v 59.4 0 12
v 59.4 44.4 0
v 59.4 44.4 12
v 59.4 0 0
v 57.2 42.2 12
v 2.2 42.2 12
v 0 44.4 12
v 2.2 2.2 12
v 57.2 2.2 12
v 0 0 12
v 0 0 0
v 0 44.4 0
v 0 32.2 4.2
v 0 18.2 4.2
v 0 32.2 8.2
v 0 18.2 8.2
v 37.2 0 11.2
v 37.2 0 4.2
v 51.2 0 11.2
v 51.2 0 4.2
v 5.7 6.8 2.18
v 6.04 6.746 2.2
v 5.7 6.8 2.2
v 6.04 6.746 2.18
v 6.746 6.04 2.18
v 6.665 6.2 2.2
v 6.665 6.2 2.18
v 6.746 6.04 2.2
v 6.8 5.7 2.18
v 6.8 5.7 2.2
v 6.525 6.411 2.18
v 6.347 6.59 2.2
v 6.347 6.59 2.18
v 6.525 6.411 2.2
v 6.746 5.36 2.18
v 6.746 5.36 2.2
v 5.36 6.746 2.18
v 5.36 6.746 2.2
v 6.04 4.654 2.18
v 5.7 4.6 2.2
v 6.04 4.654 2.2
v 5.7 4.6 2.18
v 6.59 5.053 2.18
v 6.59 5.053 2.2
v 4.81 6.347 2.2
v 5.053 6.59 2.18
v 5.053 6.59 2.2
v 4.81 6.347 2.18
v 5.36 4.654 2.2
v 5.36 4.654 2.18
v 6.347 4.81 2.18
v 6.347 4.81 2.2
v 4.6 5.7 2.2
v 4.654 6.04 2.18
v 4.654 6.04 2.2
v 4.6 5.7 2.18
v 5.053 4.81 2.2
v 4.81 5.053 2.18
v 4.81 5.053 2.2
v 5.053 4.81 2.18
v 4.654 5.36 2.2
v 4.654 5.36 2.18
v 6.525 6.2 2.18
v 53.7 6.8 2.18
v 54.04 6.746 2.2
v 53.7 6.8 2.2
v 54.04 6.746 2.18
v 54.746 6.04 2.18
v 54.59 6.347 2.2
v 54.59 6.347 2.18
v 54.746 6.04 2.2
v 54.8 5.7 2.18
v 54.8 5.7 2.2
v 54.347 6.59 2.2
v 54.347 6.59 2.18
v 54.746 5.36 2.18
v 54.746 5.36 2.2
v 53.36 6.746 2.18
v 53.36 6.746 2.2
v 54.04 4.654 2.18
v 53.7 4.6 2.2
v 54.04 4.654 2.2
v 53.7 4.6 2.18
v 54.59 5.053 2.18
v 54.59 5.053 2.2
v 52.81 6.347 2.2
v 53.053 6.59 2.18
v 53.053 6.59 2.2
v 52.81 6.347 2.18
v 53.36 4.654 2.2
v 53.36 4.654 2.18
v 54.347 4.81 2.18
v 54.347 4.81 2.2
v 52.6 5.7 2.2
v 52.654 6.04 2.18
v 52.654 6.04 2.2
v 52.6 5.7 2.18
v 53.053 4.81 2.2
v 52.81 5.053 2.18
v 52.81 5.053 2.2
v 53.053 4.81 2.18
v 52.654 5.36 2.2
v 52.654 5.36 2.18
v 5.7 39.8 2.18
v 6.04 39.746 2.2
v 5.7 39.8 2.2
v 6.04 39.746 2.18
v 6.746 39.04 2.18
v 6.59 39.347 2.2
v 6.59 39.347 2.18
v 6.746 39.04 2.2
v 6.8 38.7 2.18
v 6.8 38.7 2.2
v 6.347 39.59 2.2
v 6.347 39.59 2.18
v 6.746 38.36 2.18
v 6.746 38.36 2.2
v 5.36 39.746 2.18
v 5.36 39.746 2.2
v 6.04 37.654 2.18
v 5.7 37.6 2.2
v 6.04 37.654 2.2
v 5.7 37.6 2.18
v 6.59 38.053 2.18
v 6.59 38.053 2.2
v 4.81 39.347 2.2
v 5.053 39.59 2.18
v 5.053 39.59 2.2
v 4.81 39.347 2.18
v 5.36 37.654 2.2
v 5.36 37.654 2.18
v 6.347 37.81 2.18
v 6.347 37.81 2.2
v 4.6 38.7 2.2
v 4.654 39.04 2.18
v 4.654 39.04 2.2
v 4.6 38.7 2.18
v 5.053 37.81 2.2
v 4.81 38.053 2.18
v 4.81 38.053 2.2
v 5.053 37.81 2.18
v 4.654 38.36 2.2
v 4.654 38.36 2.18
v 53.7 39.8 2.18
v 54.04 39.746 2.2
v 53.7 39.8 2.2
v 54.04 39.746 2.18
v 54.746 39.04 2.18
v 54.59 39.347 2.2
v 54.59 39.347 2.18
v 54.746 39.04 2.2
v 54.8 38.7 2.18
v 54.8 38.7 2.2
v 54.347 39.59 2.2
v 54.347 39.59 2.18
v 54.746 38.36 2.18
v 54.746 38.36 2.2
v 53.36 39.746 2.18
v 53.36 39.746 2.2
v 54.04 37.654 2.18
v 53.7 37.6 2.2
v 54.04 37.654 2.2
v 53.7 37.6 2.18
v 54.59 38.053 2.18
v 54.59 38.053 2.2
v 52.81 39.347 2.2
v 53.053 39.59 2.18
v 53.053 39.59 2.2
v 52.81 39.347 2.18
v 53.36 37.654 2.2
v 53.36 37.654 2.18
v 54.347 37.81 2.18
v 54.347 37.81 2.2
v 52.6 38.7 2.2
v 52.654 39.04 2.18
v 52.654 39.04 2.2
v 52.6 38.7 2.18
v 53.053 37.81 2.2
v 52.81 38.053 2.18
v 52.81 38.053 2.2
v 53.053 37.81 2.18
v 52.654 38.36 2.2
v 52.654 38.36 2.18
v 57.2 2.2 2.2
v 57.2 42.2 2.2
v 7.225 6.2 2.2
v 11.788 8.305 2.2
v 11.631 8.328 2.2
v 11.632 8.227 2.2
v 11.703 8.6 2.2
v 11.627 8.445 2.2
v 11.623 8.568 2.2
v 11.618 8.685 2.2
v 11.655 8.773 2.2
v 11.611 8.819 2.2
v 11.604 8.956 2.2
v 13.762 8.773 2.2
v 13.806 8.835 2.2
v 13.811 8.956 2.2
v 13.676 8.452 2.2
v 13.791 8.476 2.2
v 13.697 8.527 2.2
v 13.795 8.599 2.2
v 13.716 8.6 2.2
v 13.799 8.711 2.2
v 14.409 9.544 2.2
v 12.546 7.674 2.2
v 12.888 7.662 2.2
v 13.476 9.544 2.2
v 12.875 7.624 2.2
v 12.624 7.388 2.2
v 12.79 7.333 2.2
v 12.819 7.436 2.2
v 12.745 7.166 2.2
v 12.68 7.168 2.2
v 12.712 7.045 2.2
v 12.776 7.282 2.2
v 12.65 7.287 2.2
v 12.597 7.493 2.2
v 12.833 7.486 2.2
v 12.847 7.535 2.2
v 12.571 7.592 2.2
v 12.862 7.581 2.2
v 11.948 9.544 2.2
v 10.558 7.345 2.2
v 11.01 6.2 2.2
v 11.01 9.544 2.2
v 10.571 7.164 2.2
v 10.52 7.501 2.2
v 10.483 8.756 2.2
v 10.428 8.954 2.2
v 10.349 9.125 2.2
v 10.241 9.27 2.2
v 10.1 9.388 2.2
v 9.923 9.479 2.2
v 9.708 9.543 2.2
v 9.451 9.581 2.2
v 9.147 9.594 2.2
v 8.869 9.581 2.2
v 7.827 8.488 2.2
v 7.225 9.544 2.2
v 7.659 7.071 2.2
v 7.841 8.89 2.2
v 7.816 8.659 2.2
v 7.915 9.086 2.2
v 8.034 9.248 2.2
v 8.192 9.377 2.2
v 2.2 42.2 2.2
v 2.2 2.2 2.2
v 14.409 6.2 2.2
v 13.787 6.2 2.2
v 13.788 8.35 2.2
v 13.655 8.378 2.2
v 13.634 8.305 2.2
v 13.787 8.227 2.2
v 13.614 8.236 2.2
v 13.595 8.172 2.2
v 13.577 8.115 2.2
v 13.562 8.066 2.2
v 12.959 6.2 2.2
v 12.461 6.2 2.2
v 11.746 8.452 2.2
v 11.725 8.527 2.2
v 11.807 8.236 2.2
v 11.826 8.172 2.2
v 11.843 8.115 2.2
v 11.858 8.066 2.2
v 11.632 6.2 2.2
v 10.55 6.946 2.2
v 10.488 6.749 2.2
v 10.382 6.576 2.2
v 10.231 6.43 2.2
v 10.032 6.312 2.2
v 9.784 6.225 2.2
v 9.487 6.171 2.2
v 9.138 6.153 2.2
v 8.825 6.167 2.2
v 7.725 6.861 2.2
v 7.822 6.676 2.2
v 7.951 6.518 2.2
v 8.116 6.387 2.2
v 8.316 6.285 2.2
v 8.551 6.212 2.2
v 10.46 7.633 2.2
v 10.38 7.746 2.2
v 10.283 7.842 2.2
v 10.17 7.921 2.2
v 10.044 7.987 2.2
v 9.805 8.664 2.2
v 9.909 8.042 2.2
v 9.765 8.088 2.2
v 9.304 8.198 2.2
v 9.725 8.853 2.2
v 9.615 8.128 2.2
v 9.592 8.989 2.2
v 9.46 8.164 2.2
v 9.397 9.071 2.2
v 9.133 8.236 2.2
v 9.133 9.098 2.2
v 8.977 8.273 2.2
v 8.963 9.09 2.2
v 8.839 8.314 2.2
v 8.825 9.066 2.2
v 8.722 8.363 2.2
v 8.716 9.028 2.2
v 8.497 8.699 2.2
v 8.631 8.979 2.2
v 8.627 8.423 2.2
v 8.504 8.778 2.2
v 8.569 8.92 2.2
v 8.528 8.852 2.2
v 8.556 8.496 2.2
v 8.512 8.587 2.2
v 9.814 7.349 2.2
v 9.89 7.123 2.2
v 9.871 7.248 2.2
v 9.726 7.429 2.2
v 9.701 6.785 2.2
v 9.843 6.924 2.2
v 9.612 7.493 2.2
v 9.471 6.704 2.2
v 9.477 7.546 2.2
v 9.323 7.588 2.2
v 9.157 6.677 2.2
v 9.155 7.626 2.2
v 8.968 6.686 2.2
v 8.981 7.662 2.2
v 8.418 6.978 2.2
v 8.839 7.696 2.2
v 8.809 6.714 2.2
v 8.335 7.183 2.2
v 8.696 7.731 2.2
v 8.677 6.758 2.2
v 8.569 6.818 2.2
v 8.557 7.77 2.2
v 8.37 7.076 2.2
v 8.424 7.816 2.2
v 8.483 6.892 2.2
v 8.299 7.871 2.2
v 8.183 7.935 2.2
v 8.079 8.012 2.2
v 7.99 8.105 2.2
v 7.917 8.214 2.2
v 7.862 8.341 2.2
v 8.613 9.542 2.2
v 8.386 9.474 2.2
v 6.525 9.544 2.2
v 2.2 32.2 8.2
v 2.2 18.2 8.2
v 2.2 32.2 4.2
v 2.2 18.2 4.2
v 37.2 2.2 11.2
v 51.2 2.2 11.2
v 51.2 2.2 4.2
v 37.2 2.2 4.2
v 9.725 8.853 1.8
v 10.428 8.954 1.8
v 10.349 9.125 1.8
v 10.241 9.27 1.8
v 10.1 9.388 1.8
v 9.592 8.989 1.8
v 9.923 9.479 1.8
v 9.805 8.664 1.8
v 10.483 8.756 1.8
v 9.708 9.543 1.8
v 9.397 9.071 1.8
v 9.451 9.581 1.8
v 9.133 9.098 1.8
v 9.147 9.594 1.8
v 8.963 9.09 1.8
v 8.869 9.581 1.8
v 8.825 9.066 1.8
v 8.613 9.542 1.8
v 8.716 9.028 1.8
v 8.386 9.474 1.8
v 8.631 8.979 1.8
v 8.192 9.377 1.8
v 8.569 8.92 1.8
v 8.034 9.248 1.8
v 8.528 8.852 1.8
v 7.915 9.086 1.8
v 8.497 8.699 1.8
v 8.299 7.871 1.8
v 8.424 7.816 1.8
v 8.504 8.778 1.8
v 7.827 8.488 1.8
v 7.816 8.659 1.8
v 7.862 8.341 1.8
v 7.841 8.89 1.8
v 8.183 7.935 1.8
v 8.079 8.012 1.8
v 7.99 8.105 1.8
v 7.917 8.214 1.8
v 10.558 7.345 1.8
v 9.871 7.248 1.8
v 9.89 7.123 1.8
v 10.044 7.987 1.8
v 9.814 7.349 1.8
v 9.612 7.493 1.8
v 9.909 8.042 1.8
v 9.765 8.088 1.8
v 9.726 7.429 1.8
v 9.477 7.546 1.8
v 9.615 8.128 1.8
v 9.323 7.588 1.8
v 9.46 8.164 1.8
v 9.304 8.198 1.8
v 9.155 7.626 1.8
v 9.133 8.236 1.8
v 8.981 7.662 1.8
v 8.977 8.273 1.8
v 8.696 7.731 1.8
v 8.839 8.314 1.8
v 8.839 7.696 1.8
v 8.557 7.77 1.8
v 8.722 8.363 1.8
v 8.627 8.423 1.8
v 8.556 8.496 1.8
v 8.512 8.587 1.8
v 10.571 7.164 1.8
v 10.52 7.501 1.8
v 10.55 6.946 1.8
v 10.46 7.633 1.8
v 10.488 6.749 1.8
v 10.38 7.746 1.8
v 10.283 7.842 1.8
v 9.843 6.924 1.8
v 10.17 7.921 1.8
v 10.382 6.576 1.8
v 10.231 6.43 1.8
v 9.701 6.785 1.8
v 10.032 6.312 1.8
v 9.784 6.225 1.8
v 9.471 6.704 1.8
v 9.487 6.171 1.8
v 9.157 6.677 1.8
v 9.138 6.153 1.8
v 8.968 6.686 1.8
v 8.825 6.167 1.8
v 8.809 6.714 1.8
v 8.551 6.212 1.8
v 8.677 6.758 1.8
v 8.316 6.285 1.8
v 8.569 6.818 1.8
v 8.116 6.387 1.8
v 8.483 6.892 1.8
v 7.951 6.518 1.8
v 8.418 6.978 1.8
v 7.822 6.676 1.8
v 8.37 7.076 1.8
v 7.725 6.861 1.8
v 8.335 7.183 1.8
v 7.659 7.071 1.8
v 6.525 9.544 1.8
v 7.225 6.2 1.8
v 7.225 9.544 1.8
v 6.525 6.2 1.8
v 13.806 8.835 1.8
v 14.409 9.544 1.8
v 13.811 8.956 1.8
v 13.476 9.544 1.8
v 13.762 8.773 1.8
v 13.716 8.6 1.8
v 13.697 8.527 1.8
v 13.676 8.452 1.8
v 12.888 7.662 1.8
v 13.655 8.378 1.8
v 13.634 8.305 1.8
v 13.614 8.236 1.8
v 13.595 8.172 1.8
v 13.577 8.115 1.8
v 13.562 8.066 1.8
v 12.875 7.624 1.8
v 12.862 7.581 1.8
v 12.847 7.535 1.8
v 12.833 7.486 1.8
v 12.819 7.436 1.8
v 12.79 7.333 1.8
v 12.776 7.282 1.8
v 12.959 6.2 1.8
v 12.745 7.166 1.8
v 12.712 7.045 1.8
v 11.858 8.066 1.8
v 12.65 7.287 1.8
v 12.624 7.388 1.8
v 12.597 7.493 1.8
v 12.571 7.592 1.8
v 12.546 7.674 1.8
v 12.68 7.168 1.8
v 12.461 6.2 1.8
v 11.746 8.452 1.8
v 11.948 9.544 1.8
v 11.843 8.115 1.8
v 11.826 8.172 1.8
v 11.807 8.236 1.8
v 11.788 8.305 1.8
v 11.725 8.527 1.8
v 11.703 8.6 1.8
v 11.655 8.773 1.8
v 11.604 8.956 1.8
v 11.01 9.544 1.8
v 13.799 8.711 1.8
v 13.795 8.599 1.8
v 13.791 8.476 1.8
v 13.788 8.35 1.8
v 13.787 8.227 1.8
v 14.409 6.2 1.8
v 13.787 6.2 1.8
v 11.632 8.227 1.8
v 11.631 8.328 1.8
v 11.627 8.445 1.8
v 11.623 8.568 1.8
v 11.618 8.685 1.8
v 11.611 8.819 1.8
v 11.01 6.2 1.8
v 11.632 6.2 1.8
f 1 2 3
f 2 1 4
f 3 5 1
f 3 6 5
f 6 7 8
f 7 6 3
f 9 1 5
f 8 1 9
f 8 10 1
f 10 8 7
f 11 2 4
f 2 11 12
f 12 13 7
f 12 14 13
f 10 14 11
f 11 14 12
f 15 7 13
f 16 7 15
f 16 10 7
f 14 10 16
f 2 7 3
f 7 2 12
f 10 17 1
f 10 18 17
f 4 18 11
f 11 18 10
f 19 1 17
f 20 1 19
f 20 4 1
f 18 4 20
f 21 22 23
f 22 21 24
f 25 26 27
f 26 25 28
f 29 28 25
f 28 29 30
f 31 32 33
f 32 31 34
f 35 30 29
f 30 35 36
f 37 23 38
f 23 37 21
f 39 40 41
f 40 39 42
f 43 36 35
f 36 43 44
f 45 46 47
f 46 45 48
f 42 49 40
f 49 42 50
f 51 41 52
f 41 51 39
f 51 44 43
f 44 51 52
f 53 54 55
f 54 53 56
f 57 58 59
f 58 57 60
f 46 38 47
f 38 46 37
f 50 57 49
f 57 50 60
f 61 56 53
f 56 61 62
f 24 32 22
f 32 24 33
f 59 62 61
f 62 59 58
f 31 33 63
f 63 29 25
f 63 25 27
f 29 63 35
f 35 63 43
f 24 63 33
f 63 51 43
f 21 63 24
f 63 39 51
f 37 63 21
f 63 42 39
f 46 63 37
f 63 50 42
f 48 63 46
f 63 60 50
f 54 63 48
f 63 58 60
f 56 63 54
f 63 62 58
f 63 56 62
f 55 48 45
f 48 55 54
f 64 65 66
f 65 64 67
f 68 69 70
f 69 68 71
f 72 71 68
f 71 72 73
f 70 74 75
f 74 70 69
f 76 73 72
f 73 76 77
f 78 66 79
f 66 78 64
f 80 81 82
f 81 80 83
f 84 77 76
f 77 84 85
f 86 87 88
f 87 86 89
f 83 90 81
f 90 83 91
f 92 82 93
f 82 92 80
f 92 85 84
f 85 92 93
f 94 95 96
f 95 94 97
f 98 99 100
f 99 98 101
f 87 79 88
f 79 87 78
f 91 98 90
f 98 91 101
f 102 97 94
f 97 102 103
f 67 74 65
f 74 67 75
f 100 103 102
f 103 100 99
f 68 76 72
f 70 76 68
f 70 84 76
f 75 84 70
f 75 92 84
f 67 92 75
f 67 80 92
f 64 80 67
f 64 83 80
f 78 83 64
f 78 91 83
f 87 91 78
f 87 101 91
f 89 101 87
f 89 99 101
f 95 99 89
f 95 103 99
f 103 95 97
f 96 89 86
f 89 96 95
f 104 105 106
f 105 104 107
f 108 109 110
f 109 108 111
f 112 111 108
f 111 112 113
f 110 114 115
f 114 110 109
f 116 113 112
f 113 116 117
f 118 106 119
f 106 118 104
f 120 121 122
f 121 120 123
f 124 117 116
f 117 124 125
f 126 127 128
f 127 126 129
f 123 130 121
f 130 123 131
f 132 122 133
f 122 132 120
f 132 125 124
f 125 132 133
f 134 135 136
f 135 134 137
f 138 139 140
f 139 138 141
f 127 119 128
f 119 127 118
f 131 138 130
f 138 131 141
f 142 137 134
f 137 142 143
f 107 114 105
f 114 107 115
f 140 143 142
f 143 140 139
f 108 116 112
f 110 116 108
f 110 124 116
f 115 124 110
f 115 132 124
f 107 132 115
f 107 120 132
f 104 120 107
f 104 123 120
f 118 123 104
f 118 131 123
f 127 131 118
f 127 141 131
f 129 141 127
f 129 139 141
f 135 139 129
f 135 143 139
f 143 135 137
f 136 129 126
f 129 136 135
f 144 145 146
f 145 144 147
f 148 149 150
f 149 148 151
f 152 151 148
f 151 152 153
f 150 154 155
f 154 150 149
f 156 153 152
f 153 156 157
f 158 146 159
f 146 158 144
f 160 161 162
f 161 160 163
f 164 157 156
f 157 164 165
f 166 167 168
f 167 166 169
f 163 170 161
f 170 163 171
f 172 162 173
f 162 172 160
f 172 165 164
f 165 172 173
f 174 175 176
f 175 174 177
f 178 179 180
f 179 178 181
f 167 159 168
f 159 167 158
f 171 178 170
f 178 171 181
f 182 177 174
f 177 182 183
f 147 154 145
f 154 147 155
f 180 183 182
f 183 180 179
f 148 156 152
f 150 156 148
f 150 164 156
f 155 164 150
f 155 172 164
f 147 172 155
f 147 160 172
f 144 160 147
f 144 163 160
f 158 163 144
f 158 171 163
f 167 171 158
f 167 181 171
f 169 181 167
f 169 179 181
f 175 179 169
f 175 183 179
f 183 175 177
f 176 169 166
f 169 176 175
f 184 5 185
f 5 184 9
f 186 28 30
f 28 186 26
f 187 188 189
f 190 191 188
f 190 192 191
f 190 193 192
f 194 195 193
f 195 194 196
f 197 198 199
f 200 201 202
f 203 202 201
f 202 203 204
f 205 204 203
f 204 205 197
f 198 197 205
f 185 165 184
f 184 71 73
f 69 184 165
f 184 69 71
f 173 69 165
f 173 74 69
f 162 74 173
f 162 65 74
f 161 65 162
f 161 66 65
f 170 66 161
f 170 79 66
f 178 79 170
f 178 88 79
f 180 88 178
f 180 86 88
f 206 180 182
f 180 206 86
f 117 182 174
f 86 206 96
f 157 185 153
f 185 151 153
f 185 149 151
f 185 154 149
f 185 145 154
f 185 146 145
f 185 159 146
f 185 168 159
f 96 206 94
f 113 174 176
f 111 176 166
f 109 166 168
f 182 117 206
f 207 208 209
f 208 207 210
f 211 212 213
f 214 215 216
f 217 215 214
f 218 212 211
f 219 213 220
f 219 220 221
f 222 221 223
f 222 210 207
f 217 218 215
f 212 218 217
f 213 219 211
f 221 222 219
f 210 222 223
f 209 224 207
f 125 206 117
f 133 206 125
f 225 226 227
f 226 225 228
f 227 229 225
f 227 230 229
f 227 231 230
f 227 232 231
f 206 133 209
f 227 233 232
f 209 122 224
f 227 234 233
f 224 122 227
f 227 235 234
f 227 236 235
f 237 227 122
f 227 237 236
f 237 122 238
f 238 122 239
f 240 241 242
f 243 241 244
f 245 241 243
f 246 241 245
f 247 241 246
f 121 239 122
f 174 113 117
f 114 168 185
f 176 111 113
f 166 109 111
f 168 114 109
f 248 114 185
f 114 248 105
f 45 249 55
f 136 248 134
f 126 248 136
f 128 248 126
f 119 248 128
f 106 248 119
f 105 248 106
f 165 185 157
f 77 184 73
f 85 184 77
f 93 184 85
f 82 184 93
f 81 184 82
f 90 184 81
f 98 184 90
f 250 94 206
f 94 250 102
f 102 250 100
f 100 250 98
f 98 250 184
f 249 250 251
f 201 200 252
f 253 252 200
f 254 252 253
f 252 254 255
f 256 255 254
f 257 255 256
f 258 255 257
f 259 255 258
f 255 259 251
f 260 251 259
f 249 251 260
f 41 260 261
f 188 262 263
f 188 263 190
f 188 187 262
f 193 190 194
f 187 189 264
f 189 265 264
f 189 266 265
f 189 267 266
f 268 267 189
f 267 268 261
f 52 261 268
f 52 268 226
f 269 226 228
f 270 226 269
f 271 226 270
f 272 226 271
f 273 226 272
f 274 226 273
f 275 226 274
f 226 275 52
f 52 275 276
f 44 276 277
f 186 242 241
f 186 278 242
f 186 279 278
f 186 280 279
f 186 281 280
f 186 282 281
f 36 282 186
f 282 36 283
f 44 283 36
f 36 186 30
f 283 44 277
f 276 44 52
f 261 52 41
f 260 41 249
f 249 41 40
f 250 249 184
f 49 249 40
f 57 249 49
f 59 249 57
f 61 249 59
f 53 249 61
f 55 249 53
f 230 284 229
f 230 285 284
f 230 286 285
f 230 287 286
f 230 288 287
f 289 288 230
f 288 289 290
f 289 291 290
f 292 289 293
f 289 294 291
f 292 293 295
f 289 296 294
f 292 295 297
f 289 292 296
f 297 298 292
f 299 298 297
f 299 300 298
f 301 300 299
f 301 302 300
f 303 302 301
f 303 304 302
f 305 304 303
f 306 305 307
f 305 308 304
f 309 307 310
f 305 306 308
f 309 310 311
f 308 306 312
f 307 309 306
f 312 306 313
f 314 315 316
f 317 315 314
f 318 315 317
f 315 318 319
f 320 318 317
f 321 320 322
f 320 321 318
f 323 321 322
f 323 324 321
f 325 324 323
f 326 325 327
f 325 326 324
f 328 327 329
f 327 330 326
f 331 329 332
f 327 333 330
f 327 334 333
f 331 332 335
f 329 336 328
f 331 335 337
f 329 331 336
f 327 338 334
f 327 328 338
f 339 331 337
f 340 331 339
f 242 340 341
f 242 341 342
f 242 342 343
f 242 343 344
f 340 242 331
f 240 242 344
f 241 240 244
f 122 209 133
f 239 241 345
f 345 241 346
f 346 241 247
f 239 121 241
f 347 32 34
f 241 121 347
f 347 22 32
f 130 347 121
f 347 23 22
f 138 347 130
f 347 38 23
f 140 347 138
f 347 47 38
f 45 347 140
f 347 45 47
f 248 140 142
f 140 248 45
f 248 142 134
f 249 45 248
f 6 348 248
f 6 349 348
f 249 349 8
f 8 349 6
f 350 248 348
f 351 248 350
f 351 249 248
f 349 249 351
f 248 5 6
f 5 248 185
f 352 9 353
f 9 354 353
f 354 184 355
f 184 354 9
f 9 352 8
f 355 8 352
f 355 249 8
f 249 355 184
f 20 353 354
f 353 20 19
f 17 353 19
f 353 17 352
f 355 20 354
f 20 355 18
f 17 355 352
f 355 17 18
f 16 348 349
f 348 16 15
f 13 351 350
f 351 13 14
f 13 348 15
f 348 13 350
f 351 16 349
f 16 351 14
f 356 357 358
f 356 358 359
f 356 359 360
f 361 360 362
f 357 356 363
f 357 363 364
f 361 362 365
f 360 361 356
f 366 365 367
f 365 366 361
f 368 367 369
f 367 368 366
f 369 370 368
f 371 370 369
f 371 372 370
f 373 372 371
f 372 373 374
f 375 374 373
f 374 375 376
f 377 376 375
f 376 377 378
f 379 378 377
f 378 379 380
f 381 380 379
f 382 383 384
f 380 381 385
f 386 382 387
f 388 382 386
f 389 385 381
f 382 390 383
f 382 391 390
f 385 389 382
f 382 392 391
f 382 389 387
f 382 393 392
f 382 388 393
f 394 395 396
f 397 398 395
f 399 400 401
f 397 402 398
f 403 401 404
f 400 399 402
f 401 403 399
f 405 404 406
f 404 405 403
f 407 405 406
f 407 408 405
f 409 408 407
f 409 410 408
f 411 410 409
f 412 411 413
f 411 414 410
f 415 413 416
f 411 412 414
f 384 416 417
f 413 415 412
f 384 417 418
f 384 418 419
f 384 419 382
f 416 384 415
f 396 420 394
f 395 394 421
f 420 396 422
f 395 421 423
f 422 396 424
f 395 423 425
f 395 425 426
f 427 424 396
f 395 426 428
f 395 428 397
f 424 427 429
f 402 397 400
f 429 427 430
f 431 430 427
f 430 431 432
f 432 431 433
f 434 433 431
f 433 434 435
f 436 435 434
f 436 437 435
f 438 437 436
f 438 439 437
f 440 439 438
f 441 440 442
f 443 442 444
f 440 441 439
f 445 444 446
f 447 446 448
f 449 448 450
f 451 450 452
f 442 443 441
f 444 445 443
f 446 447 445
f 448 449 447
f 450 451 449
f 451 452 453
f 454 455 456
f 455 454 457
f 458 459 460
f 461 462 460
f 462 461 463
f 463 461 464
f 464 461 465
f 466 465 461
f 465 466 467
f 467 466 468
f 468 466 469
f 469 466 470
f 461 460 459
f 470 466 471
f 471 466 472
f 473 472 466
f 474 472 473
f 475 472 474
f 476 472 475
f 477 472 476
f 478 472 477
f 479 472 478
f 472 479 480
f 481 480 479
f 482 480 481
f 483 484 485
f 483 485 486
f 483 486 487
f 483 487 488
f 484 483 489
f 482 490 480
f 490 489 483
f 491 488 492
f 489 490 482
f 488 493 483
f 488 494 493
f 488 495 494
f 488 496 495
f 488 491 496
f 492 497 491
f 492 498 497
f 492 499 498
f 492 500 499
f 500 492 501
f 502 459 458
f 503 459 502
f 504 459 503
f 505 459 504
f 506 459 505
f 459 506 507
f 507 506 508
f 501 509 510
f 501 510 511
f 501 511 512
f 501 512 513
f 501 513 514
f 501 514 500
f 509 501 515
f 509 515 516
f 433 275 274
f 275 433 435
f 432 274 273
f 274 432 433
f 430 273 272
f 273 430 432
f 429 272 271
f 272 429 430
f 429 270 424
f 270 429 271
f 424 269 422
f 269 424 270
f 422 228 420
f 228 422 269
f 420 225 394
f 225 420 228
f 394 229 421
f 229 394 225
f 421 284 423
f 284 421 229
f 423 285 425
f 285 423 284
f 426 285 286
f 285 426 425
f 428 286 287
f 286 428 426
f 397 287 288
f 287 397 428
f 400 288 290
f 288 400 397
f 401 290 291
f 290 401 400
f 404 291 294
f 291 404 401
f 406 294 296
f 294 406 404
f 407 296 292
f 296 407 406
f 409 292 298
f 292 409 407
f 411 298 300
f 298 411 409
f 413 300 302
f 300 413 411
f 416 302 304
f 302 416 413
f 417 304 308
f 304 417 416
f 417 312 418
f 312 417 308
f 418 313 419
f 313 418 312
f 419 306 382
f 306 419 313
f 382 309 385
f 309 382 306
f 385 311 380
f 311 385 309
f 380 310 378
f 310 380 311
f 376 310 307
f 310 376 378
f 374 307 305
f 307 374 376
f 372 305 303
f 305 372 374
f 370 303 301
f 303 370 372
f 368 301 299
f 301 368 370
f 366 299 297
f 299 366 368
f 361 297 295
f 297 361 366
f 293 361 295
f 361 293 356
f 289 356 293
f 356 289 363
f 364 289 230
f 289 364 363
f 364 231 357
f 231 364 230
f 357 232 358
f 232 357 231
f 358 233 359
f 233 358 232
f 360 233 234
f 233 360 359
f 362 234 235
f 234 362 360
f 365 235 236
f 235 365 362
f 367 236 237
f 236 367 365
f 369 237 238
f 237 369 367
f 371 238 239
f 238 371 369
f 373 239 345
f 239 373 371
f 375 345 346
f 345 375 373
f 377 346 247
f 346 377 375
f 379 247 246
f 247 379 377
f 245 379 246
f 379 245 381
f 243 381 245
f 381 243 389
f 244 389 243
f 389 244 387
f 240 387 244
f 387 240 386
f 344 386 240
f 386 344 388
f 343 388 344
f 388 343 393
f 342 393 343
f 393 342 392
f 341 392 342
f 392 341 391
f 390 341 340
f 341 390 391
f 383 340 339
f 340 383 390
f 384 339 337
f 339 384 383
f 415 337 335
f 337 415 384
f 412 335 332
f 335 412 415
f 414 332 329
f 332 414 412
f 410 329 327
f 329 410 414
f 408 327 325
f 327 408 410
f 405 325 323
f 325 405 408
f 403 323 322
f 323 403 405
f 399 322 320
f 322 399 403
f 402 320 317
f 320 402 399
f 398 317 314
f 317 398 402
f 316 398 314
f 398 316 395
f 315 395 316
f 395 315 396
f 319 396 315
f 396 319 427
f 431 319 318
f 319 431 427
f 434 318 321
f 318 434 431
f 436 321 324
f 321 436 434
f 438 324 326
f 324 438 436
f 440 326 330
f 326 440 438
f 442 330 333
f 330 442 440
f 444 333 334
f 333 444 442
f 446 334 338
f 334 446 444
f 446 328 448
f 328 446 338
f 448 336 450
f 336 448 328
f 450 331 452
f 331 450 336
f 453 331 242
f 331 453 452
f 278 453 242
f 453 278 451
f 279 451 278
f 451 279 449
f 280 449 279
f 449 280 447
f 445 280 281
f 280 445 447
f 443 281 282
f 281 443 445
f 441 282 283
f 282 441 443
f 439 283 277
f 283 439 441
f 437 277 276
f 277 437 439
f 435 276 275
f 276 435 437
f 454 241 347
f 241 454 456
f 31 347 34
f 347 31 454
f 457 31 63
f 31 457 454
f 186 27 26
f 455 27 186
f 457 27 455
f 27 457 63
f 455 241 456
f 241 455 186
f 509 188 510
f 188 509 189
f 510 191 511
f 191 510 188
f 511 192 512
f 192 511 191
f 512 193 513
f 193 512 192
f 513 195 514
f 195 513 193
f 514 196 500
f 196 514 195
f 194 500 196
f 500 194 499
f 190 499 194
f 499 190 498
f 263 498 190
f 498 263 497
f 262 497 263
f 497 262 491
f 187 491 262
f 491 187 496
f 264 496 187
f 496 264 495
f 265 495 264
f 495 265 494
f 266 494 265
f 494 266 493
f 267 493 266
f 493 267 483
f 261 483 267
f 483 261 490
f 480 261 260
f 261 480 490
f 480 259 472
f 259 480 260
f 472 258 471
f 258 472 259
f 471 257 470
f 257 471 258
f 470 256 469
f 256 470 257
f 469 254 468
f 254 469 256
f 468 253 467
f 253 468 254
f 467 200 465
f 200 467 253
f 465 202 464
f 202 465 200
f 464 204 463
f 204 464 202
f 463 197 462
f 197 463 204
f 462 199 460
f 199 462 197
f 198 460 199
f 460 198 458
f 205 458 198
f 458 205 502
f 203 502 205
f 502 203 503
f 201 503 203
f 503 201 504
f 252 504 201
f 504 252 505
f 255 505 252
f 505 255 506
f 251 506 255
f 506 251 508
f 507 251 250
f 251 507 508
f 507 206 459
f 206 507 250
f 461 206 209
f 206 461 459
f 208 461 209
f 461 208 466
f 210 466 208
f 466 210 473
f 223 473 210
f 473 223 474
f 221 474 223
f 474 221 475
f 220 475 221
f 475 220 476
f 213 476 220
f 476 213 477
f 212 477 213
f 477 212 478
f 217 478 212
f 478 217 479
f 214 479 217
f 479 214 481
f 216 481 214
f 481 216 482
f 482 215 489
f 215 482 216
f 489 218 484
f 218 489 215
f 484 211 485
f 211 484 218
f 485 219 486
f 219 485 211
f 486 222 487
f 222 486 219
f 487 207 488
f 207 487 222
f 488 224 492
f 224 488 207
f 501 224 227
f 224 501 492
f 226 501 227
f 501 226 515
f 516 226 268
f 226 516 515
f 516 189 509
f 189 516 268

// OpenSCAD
// ISM Flash Cards reader shell (original ISM)
// Manifold-safe: bosses unioned, openings cut in one difference().
pcb_w = 55;
pcb_d = 40;
wall = 2.2;
box_h = 12;
eps = 0.02;
mount_d = 2.2;
badge_depth = 0.4;

mounts = [[3.5, 3.5], [pcb_w - 3.5, 3.5], [3.5, pcb_d - 3.5], [pcb_w - 3.5, pcb_d - 3.5]];

module reader() {
  difference() {
    union() {
      cube([pcb_w + 2 * wall, pcb_d + 2 * wall, box_h]);
      for (p = mounts)
        translate([p[0] + wall, p[1] + wall, wall - eps])
          cylinder(h = 4 + eps, d = 5, $fn = 24);
    }
    translate([wall, wall, wall])
      cube([pcb_w, pcb_d, box_h - wall + eps]);
    // USB-C
    translate([wall + pcb_w - 20, -eps, wall + 2])
      cube([14, wall + 4, 7]);
    // microSD slot
    translate([-eps, wall + 16, wall + 2])
      cube([wall + 6, 14, 4]);
    for (p = mounts)
      translate([p[0] + wall, p[1] + wall, wall - eps])
        cylinder(h = 8 + 2 * eps, d = mount_d, $fn = 20);
    translate([wall + 4, wall + 4, wall - badge_depth])
      linear_extrude(height = badge_depth + eps)
        text("ISM", size = 3.5, font = "Liberation Sans:style=Bold");
  }
}

module card_shell() {
  // Approximate microSD outline (SD Physical Layer Simplified Spec family)
  // 15 × 11 × 1 mm class body for print check (±0.2 mm tolerance table in design-note)
  w = 15.0;
  d = 11.0;
  h = 1.0;
  difference() {
    cube([w, d, h]);
    translate([1.2, 1.2, h - 0.3])
      linear_extrude(height = 0.4)
        text("ISM", size = 2.2, font = "Liberation Sans:style=Bold");
  }
}

reader();
